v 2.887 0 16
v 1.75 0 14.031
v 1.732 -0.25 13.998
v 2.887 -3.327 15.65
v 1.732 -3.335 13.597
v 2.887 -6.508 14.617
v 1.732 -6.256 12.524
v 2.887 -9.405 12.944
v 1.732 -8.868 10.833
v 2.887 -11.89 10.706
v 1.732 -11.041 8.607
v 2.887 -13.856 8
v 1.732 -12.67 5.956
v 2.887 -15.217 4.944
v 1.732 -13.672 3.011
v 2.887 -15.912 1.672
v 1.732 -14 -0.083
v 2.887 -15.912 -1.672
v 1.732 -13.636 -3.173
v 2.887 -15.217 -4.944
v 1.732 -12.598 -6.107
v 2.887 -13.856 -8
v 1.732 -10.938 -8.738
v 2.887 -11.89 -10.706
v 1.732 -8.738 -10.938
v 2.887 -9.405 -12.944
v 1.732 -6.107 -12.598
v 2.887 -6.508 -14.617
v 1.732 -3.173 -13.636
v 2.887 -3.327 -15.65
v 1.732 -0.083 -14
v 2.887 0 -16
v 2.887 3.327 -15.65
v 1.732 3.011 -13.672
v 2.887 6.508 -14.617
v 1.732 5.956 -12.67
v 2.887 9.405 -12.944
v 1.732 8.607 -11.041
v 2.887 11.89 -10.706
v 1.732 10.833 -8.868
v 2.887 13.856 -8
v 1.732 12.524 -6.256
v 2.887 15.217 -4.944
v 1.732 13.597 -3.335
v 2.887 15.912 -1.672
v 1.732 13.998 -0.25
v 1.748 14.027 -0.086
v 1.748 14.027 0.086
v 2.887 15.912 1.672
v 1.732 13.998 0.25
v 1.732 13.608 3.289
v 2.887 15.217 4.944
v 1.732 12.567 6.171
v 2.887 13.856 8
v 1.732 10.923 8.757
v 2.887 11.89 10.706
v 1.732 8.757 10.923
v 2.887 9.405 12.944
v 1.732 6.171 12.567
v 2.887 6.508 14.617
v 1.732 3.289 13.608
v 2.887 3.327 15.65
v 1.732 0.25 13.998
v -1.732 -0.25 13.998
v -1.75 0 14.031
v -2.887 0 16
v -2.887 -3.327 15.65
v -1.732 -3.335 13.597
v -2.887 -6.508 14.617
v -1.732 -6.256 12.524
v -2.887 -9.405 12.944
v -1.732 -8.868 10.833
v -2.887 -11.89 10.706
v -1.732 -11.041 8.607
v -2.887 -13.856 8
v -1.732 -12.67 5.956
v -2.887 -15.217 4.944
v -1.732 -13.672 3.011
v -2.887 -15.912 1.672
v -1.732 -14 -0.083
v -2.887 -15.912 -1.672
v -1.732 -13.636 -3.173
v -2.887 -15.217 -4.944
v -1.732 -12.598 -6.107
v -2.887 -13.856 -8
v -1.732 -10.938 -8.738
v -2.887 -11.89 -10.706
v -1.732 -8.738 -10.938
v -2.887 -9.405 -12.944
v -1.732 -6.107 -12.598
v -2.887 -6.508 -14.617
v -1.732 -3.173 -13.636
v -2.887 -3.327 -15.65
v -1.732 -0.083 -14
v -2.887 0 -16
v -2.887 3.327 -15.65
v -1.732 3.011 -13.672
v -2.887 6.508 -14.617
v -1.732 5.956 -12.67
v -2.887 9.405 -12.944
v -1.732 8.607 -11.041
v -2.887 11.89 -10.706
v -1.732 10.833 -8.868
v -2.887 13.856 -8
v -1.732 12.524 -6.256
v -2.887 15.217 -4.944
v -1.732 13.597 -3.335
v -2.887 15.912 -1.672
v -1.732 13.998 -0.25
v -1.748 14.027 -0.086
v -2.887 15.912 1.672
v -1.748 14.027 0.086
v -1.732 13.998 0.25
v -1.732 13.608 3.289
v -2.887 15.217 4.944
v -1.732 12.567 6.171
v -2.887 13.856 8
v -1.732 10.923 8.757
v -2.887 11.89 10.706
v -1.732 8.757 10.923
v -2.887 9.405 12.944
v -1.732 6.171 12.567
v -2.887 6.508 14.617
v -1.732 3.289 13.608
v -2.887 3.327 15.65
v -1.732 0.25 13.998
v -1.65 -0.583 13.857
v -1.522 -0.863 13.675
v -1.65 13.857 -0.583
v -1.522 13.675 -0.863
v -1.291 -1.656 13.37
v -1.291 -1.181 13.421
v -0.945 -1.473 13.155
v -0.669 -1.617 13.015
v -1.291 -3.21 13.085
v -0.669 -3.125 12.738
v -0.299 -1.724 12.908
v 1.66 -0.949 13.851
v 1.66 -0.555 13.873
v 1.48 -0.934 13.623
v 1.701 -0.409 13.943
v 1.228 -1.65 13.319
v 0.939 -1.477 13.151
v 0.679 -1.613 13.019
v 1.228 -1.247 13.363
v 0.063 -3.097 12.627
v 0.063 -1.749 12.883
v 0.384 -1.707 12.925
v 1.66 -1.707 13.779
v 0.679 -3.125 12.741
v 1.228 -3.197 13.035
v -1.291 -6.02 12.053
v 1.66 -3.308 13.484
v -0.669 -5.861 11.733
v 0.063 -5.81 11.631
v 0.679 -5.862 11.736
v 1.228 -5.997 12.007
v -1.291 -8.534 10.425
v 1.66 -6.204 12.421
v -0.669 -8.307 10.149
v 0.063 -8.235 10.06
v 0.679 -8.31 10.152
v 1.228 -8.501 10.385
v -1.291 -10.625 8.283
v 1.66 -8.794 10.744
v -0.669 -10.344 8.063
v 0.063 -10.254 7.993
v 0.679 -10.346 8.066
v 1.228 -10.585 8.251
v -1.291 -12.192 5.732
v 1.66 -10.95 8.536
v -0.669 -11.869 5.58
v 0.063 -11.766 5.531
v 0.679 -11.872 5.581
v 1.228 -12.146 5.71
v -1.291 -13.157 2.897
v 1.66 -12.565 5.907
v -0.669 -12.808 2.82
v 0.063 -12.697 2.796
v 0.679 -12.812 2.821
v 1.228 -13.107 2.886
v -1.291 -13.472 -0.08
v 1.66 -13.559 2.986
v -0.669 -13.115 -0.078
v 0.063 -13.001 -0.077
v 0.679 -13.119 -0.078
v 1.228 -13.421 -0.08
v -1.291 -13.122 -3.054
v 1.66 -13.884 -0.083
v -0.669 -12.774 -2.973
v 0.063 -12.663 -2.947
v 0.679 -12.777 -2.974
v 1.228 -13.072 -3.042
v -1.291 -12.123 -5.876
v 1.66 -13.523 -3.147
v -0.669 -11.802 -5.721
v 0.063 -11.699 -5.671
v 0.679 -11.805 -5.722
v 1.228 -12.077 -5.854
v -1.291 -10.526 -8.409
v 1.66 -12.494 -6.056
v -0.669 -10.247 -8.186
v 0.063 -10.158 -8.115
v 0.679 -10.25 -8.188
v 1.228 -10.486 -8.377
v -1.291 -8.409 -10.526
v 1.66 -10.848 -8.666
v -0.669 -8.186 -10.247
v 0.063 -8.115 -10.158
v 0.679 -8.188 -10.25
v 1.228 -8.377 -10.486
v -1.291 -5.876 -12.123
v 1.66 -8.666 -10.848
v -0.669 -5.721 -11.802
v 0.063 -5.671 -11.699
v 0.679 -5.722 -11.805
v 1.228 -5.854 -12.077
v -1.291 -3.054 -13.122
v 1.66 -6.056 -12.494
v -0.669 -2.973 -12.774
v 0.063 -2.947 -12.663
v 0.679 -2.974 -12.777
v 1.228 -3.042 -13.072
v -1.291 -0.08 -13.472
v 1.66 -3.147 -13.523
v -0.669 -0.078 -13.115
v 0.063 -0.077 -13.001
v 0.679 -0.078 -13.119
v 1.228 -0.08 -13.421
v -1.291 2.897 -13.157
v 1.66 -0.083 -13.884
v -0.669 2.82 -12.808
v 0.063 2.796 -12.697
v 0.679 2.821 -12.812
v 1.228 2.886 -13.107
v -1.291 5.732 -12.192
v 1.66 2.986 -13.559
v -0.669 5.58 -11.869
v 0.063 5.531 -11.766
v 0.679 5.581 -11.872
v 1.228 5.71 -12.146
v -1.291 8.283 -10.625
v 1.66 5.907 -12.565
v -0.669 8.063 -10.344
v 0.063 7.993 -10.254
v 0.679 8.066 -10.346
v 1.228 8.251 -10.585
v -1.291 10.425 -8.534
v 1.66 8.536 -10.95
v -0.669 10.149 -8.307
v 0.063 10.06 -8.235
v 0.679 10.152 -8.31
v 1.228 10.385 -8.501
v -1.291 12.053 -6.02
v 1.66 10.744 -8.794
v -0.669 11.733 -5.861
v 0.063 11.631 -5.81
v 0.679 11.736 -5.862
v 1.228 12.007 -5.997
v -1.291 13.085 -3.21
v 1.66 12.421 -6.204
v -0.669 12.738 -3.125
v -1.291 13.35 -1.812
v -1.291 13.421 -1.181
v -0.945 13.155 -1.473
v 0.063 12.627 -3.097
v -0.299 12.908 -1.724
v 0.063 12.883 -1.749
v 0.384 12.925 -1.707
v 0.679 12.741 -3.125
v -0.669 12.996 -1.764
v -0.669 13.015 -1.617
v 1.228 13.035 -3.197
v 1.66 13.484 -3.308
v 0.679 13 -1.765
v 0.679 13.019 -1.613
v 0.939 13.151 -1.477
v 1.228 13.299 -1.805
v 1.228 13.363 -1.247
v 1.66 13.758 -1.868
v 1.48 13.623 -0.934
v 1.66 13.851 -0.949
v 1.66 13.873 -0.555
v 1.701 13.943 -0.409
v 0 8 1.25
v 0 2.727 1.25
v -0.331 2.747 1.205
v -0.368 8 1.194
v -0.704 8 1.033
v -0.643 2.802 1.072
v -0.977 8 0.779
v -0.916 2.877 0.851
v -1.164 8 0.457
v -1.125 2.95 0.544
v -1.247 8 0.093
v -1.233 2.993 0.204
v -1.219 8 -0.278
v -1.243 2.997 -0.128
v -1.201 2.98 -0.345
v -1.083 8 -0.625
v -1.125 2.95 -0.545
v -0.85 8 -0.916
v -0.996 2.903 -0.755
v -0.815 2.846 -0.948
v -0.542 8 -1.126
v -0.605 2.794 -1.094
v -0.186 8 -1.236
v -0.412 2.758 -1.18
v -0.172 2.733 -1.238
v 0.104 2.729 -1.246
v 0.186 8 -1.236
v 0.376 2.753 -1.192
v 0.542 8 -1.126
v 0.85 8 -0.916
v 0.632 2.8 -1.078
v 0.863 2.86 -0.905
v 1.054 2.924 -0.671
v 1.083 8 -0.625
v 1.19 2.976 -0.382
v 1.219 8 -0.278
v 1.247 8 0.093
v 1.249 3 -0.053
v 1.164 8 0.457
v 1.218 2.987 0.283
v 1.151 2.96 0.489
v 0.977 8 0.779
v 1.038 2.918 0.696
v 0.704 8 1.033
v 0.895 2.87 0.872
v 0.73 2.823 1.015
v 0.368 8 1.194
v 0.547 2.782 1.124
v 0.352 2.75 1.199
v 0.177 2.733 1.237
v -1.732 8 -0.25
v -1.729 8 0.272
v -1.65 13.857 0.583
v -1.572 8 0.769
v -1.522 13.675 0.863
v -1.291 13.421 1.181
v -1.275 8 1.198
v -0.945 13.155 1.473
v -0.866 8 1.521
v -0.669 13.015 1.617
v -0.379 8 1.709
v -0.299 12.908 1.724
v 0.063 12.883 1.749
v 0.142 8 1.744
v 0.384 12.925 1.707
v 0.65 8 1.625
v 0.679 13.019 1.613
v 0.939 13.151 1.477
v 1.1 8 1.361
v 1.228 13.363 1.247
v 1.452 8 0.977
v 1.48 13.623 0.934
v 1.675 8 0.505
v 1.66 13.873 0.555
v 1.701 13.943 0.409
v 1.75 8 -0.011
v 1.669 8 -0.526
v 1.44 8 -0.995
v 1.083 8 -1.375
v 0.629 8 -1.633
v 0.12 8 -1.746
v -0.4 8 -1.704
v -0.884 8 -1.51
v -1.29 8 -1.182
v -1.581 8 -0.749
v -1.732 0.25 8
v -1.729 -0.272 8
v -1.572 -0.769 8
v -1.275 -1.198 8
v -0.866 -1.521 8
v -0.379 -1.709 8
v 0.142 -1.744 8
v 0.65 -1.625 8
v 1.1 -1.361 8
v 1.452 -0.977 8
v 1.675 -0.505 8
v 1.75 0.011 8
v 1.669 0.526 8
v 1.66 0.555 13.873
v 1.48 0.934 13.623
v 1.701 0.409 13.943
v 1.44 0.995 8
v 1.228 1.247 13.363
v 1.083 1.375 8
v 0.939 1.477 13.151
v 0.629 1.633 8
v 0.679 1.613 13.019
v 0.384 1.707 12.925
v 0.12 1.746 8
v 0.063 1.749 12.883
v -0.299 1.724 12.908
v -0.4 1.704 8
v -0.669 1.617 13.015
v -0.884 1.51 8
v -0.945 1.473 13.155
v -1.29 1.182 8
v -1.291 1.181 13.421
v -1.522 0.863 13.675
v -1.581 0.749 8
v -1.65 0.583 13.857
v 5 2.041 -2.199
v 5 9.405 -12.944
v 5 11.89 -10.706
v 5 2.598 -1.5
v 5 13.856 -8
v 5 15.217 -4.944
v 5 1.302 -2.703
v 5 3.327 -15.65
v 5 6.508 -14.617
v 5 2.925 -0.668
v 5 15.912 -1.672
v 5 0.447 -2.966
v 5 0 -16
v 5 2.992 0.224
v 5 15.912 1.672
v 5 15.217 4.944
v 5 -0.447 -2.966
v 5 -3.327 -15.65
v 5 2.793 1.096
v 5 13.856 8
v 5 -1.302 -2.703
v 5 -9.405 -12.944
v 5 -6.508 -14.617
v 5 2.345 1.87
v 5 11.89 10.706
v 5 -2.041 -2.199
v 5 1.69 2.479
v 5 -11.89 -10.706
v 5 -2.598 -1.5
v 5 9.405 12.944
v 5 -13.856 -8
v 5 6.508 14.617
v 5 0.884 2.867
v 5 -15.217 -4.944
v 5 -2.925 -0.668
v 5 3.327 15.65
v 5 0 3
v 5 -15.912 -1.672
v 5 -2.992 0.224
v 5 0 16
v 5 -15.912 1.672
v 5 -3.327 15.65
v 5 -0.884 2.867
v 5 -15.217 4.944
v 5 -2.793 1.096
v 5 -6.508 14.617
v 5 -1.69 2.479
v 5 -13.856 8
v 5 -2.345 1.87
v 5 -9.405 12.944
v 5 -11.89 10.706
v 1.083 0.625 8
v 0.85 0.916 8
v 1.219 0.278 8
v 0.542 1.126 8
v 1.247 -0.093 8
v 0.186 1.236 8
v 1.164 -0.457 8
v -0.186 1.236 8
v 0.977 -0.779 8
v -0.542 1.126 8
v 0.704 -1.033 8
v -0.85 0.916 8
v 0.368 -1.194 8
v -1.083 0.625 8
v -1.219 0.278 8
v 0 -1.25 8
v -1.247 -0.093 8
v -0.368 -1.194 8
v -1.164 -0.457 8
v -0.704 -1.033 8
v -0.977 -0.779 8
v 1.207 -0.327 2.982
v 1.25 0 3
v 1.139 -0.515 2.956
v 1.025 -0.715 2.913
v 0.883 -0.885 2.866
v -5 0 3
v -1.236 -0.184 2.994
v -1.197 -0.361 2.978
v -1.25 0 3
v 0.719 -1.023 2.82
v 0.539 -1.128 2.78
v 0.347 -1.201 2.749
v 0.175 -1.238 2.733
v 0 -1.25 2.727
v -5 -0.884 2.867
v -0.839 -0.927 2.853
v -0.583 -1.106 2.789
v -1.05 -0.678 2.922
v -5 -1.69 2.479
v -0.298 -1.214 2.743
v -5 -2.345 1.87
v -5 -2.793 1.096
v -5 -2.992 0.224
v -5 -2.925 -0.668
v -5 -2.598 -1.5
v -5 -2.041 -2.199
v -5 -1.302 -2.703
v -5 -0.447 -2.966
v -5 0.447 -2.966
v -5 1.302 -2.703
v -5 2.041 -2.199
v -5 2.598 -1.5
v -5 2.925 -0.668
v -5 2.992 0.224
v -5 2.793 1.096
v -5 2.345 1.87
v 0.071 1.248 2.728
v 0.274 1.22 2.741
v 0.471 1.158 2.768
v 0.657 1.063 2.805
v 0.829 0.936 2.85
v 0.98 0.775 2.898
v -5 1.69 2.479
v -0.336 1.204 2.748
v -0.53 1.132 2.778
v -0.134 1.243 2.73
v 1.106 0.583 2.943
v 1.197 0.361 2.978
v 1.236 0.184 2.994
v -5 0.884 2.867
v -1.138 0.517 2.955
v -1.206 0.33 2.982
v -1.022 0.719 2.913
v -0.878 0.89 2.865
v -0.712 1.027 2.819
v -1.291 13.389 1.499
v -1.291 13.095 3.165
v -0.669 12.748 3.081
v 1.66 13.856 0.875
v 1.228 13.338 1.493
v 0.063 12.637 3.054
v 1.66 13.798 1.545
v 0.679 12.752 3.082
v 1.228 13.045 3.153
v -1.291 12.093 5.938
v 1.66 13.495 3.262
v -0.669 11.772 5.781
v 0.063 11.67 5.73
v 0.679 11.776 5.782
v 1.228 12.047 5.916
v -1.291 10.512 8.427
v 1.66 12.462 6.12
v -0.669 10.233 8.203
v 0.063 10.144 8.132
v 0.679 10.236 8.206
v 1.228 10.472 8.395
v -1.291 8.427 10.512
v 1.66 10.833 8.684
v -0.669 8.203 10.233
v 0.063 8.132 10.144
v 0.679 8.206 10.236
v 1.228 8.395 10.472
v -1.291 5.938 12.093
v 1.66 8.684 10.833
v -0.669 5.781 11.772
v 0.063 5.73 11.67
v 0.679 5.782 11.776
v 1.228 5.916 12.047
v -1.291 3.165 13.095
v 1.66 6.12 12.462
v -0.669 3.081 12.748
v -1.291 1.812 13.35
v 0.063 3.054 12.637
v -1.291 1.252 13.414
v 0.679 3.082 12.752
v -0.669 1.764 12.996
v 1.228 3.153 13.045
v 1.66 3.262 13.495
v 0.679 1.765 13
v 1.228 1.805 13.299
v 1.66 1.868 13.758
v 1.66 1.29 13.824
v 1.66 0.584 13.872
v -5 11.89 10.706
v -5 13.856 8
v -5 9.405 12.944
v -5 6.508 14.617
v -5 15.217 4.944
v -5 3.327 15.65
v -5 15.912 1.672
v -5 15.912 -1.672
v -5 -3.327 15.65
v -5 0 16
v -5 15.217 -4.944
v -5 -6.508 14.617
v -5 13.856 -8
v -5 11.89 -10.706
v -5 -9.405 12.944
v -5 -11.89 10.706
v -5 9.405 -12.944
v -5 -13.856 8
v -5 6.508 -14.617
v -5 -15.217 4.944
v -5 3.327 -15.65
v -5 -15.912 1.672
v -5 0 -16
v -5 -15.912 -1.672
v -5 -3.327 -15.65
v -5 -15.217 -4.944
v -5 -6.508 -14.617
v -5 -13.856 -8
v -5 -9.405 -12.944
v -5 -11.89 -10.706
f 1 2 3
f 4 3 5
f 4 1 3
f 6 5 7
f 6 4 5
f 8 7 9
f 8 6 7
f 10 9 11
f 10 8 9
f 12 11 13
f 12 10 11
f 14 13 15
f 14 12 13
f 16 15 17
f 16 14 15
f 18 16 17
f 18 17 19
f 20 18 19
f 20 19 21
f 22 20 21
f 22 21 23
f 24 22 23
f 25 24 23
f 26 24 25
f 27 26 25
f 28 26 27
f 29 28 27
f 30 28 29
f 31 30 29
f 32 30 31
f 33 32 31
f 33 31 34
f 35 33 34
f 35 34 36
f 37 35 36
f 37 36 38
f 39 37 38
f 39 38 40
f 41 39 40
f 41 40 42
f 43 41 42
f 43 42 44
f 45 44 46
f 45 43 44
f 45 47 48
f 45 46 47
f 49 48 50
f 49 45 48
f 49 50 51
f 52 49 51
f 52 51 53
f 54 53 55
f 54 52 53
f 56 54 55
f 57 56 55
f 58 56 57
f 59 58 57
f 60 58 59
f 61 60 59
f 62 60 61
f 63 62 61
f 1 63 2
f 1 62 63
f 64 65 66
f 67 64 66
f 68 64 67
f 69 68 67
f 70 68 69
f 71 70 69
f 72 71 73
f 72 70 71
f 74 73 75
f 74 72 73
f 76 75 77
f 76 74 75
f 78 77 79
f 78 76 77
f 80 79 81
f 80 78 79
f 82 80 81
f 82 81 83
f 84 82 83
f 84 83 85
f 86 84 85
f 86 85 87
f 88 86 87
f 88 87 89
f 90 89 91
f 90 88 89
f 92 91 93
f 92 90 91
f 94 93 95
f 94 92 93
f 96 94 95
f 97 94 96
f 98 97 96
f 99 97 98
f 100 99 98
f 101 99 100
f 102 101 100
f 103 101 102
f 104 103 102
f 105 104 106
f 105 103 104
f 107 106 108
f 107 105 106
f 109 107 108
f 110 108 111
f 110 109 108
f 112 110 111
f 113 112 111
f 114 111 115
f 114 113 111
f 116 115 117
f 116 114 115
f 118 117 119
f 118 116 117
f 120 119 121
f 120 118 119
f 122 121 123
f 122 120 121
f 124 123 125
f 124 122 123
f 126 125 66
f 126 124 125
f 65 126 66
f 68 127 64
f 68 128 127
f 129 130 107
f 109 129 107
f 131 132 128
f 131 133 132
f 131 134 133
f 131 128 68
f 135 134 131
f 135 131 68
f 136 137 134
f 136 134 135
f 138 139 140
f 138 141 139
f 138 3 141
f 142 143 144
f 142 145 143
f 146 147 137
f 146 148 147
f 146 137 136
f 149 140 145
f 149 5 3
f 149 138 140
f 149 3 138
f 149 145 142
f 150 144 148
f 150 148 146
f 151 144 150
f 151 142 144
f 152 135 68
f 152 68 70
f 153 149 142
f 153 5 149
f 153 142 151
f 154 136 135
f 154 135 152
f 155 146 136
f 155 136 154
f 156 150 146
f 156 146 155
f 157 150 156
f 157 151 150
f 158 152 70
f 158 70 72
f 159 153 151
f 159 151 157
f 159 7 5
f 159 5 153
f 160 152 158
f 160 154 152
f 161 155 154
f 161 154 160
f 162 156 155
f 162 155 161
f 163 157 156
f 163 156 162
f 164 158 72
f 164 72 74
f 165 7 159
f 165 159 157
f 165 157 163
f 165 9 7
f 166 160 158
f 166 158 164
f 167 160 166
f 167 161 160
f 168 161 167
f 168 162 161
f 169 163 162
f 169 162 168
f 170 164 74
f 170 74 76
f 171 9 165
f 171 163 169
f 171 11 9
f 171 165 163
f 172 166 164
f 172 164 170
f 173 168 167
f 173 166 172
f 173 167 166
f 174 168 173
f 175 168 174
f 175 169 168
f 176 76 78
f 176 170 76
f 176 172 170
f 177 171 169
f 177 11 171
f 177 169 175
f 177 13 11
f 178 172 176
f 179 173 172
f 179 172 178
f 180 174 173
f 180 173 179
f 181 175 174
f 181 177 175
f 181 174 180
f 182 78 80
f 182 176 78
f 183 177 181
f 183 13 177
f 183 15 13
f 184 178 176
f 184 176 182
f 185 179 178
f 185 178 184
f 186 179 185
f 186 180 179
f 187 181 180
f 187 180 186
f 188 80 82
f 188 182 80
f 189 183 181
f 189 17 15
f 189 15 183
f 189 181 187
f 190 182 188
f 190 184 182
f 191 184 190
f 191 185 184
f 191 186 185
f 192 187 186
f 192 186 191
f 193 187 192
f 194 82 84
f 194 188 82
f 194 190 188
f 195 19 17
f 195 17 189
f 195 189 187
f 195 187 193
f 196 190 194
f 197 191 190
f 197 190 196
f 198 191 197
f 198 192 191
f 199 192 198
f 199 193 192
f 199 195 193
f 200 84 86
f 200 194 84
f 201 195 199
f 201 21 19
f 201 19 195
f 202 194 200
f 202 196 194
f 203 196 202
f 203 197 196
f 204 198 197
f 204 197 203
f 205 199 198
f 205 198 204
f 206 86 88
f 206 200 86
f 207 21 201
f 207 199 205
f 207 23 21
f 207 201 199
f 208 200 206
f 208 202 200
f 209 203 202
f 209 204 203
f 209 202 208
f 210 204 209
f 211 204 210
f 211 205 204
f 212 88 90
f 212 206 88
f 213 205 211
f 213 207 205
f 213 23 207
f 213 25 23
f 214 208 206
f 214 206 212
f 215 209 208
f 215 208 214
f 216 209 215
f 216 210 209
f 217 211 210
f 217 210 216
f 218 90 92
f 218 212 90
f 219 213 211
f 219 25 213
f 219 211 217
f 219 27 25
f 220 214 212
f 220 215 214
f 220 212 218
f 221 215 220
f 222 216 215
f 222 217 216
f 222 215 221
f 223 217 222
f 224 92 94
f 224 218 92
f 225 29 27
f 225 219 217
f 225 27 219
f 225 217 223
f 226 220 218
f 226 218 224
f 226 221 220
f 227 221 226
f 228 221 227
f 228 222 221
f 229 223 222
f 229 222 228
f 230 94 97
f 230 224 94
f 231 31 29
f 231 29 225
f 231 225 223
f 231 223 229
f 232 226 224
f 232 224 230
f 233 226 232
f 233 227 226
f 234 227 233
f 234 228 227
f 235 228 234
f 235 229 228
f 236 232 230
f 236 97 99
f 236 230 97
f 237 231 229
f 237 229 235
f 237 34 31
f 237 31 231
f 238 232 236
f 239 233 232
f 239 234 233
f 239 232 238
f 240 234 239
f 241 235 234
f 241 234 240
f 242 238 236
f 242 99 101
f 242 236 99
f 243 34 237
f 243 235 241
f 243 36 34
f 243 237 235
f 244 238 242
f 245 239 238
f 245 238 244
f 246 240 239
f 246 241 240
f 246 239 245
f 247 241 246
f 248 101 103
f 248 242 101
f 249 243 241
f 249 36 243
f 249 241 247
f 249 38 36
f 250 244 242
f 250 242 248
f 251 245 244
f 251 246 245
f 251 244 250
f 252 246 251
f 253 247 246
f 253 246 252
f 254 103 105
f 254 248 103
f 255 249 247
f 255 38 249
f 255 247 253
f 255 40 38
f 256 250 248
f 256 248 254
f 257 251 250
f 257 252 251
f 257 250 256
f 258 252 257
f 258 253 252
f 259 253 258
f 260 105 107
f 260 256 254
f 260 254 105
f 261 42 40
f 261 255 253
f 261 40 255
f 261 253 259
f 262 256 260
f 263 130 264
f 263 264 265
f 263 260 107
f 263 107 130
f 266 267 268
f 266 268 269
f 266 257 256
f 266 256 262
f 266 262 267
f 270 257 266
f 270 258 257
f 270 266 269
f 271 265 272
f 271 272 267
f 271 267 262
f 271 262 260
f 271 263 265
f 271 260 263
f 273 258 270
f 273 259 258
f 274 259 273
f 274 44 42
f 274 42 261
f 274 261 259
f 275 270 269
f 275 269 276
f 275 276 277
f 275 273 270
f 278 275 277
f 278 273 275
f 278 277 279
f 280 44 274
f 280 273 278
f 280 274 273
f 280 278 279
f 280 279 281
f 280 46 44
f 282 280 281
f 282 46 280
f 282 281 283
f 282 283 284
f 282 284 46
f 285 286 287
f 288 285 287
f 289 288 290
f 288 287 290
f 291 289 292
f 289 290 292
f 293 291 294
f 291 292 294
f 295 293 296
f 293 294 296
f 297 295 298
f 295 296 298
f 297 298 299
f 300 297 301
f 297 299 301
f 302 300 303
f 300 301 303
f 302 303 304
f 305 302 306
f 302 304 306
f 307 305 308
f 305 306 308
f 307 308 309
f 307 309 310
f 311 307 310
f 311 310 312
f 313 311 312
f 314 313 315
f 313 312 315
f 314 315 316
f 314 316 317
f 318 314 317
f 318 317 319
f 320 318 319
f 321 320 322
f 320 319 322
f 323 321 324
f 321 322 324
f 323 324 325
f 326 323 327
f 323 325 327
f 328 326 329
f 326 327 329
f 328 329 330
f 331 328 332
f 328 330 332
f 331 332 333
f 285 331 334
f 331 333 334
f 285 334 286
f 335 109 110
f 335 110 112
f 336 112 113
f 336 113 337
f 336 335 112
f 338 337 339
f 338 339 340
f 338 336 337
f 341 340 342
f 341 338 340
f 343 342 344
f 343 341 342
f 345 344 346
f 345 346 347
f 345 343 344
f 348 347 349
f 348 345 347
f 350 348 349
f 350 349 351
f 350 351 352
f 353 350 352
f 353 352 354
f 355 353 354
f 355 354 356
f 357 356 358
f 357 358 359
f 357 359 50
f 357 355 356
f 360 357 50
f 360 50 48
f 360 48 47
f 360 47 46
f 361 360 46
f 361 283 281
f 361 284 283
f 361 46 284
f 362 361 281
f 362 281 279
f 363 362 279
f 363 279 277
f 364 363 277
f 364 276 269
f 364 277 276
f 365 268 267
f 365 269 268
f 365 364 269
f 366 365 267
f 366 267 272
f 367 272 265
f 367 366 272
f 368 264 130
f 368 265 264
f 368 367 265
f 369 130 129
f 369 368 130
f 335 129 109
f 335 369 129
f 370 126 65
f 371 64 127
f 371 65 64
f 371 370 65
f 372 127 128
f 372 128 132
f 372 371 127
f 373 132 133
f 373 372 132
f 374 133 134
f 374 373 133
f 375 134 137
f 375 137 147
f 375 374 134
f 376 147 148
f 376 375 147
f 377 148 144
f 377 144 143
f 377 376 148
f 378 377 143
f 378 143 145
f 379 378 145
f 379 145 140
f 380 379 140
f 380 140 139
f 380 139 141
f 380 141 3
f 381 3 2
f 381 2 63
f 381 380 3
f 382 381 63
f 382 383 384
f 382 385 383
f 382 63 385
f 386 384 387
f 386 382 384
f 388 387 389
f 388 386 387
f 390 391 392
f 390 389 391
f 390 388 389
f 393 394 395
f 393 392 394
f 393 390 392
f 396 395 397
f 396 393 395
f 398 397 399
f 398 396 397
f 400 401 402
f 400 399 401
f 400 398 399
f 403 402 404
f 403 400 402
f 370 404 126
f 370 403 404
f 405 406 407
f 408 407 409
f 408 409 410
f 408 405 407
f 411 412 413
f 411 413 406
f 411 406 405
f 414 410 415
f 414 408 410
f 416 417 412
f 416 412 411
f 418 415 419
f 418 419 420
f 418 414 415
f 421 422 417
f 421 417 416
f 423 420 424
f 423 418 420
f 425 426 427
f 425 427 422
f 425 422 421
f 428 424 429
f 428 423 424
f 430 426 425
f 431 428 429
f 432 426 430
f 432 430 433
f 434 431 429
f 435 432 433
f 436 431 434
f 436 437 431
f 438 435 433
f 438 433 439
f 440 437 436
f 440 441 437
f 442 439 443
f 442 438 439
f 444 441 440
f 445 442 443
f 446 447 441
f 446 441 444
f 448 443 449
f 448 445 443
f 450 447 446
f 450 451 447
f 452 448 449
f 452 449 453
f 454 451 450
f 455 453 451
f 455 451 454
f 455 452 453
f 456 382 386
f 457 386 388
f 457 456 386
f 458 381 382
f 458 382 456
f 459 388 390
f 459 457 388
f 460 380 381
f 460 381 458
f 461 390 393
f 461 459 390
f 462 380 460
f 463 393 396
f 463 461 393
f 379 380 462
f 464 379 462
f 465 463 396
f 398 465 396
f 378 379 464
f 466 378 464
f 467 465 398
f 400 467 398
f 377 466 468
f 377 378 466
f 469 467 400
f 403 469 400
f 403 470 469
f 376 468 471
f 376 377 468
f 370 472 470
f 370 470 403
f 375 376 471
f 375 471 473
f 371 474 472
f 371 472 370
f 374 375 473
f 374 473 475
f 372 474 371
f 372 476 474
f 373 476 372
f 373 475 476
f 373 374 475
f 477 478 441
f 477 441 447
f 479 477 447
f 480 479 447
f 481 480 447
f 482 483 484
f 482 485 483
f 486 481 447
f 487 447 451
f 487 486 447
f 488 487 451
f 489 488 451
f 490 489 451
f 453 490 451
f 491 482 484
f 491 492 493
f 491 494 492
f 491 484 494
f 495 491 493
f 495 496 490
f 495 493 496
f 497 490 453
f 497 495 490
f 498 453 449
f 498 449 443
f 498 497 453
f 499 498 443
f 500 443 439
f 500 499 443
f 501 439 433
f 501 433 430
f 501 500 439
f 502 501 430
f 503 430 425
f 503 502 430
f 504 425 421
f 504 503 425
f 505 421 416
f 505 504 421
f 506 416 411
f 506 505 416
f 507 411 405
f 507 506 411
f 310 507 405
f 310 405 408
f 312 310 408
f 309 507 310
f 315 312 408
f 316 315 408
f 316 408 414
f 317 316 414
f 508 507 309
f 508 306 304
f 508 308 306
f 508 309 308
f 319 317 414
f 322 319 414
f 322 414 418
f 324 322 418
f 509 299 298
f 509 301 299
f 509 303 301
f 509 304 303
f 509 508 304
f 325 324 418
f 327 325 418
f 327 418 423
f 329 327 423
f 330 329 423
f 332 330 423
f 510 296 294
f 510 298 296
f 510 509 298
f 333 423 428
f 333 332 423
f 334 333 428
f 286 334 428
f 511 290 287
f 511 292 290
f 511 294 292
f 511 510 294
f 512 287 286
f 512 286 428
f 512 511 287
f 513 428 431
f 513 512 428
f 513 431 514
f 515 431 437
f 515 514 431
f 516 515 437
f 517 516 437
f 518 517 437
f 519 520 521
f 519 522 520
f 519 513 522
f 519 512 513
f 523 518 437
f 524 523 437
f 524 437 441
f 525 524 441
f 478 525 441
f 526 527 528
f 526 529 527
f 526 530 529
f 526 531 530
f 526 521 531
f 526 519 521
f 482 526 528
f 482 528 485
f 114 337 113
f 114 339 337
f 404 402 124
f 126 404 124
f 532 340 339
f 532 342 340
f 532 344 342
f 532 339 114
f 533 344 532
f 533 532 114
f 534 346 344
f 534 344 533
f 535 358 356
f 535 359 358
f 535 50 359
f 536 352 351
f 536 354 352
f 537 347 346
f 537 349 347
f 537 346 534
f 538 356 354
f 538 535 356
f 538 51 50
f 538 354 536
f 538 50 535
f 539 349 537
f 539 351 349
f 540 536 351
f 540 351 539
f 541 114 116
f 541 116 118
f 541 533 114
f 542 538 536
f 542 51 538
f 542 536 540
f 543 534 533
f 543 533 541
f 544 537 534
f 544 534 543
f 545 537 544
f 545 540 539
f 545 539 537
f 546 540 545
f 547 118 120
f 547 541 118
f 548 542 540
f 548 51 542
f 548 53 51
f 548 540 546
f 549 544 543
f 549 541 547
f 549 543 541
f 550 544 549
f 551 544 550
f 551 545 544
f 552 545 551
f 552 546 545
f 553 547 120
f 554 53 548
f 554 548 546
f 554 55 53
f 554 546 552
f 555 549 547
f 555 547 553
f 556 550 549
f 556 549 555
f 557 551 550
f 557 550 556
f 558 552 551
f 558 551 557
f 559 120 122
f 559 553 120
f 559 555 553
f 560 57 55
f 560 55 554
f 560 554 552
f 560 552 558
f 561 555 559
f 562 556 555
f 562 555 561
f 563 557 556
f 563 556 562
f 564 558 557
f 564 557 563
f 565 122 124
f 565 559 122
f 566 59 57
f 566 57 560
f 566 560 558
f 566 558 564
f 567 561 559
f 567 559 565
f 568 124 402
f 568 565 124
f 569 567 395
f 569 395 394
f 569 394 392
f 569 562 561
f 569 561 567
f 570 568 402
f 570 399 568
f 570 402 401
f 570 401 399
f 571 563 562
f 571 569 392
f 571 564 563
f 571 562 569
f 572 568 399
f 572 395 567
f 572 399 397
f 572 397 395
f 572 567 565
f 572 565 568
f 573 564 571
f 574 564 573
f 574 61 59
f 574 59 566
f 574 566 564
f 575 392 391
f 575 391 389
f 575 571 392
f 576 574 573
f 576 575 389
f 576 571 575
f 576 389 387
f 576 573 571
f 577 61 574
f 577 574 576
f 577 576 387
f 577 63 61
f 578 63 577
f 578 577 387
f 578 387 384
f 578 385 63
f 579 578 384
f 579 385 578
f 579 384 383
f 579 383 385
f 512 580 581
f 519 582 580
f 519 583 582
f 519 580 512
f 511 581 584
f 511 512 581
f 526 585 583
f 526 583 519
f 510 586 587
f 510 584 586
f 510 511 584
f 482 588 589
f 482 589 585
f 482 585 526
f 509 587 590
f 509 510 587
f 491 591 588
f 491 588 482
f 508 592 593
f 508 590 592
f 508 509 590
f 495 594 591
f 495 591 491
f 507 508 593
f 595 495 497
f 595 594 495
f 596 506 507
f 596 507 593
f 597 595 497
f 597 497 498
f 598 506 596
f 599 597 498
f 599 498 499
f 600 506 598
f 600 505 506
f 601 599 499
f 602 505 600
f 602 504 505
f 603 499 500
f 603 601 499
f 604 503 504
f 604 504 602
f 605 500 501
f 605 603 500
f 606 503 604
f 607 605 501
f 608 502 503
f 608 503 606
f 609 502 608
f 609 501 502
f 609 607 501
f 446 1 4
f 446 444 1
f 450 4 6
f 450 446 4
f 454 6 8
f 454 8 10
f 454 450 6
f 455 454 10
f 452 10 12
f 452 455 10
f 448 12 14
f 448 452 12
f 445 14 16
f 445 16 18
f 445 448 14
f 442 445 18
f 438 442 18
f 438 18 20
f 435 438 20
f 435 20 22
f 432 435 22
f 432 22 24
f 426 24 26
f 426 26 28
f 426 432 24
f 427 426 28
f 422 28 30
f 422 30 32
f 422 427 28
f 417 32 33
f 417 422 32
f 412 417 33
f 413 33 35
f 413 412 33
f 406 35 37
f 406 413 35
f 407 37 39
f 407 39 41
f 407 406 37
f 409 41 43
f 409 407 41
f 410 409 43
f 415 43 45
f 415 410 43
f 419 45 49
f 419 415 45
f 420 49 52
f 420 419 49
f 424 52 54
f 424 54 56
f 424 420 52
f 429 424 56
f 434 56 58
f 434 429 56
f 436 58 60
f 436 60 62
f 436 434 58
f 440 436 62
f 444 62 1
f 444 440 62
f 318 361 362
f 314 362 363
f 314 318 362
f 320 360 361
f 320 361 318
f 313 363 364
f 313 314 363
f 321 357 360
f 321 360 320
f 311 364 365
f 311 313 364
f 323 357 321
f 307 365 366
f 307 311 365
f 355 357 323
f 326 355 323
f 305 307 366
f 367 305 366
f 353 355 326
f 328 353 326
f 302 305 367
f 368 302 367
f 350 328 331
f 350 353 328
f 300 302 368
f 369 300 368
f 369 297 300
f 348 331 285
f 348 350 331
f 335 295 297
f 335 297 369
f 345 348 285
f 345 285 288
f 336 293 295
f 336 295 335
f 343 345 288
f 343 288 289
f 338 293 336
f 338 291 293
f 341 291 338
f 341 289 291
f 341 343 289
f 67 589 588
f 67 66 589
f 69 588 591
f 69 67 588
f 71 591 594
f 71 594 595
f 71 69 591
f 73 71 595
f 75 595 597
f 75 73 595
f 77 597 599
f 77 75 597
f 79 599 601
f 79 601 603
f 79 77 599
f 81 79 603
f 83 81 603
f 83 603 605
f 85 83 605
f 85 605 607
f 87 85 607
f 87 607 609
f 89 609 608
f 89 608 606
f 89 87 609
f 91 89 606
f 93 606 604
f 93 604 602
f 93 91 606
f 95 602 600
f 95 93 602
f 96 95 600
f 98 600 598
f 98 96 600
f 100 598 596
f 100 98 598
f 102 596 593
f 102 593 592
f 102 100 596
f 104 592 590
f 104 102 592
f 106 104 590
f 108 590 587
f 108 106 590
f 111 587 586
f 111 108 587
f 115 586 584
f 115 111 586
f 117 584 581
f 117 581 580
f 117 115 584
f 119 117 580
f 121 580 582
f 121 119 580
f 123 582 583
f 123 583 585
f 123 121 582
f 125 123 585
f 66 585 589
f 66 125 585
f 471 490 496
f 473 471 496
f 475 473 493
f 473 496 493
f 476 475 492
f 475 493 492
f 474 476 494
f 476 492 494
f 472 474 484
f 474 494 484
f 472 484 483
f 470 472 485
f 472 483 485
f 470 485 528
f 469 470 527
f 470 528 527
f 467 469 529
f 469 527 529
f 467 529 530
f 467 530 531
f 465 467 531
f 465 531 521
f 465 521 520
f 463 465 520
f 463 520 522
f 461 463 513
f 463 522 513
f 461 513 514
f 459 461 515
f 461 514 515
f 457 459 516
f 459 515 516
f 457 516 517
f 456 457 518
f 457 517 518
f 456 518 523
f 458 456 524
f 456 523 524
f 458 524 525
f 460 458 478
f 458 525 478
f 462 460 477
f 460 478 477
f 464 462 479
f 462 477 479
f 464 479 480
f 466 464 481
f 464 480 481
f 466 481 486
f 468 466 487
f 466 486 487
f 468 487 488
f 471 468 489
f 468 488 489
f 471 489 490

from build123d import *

# Parameters (mm, degrees)
CUT_EXTRUDE_START        = -5
SKETCH_2_R               = 1.75
CUT_EXTRUDE_1_DEPTH      = 39.496268449
SKETCH_4_W               = 1.25
SKETCH_4_H               = 8
PATTERN_CIRCULAR_1_COUNT = 2
PATTERN_CIRCULAR_1_ANGLE = 90


with BuildPart() as part:
    # ｽｹｯﾁ1 → 回転1 (revolve)
    with BuildSketch(Plane.XY, mode=Mode.PRIVATE) as revolve_1_sk:
        with BuildLine():
            Line((5, 16), (5, 3))
            Line((5, 3), (-5, 3))
            Line((-5, 3), (-5, 16))
            Line((-5, 16), (-2.886751346, 16))
            Line((-2.886751346, 16), (-1.732050808, 14))
            ThreePointArc((-1.732050808, 14), (0, 13), (1.732050808, 14))
            Line((1.732050808, 14), (2.886751346, 16))
            Line((2.886751346, 16), (5, 16))
        make_face()
    revolve(revolve_1_sk.sketch.rotate(Axis((-76.157807816, 0, 0), (1, 0, 0)), 90), axis=Axis((-76.157807816, 0, 0), (1, 0, 0)))

    # ｽｹｯﾁ2 → ｶｯﾄ - 押し出し1 (cut)
    with BuildSketch(Plane(origin=(0, 13, 0), x_dir=(1, 0, 0), z_dir=(0, 1, 0)).offset(CUT_EXTRUDE_START)):
        with Locations(Location((0, 0, 0), (0, 0, 171.786783431))):
            Circle(SKETCH_2_R)
    cut_extrude_1 = extrude(amount=CUT_EXTRUDE_1_DEPTH, mode=Mode.SUBTRACT)

    # ｽｹｯﾁ4 → M3x0.5 ねじ穴1 (revolve, cut)
    with BuildSketch(Plane(origin=(0, 8, 0), x_dir=(0, 0, 1), z_dir=(1, 0, 0))):
        with Locations((0.625, 4)):
            Rectangle(SKETCH_4_W, SKETCH_4_H)
    m3x0_5_1 = revolve(axis=Axis((0, 14.35, 0), (0, -1, 0)), mode=Mode.SUBTRACT)

    # 円形ﾊﾟﾀｰﾝ1: ｶｯﾄ - 押し出し1, M3x0.5 ねじ穴1 ×2 about axis
    pattern_circular_1_axis = Axis((-88.99, 0, 0), (1, 0, 0))
    add([cut_extrude_1.rotate(pattern_circular_1_axis, i * PATTERN_CIRCULAR_1_ANGLE / (PATTERN_CIRCULAR_1_COUNT - 1)) for i in range(1, PATTERN_CIRCULAR_1_COUNT)], mode=Mode.SUBTRACT)
    add([m3x0_5_1.rotate(pattern_circular_1_axis, i * PATTERN_CIRCULAR_1_ANGLE / (PATTERN_CIRCULAR_1_COUNT - 1)) for i in range(1, PATTERN_CIRCULAR_1_COUNT)], mode=Mode.SUBTRACT)


solid = part.part
